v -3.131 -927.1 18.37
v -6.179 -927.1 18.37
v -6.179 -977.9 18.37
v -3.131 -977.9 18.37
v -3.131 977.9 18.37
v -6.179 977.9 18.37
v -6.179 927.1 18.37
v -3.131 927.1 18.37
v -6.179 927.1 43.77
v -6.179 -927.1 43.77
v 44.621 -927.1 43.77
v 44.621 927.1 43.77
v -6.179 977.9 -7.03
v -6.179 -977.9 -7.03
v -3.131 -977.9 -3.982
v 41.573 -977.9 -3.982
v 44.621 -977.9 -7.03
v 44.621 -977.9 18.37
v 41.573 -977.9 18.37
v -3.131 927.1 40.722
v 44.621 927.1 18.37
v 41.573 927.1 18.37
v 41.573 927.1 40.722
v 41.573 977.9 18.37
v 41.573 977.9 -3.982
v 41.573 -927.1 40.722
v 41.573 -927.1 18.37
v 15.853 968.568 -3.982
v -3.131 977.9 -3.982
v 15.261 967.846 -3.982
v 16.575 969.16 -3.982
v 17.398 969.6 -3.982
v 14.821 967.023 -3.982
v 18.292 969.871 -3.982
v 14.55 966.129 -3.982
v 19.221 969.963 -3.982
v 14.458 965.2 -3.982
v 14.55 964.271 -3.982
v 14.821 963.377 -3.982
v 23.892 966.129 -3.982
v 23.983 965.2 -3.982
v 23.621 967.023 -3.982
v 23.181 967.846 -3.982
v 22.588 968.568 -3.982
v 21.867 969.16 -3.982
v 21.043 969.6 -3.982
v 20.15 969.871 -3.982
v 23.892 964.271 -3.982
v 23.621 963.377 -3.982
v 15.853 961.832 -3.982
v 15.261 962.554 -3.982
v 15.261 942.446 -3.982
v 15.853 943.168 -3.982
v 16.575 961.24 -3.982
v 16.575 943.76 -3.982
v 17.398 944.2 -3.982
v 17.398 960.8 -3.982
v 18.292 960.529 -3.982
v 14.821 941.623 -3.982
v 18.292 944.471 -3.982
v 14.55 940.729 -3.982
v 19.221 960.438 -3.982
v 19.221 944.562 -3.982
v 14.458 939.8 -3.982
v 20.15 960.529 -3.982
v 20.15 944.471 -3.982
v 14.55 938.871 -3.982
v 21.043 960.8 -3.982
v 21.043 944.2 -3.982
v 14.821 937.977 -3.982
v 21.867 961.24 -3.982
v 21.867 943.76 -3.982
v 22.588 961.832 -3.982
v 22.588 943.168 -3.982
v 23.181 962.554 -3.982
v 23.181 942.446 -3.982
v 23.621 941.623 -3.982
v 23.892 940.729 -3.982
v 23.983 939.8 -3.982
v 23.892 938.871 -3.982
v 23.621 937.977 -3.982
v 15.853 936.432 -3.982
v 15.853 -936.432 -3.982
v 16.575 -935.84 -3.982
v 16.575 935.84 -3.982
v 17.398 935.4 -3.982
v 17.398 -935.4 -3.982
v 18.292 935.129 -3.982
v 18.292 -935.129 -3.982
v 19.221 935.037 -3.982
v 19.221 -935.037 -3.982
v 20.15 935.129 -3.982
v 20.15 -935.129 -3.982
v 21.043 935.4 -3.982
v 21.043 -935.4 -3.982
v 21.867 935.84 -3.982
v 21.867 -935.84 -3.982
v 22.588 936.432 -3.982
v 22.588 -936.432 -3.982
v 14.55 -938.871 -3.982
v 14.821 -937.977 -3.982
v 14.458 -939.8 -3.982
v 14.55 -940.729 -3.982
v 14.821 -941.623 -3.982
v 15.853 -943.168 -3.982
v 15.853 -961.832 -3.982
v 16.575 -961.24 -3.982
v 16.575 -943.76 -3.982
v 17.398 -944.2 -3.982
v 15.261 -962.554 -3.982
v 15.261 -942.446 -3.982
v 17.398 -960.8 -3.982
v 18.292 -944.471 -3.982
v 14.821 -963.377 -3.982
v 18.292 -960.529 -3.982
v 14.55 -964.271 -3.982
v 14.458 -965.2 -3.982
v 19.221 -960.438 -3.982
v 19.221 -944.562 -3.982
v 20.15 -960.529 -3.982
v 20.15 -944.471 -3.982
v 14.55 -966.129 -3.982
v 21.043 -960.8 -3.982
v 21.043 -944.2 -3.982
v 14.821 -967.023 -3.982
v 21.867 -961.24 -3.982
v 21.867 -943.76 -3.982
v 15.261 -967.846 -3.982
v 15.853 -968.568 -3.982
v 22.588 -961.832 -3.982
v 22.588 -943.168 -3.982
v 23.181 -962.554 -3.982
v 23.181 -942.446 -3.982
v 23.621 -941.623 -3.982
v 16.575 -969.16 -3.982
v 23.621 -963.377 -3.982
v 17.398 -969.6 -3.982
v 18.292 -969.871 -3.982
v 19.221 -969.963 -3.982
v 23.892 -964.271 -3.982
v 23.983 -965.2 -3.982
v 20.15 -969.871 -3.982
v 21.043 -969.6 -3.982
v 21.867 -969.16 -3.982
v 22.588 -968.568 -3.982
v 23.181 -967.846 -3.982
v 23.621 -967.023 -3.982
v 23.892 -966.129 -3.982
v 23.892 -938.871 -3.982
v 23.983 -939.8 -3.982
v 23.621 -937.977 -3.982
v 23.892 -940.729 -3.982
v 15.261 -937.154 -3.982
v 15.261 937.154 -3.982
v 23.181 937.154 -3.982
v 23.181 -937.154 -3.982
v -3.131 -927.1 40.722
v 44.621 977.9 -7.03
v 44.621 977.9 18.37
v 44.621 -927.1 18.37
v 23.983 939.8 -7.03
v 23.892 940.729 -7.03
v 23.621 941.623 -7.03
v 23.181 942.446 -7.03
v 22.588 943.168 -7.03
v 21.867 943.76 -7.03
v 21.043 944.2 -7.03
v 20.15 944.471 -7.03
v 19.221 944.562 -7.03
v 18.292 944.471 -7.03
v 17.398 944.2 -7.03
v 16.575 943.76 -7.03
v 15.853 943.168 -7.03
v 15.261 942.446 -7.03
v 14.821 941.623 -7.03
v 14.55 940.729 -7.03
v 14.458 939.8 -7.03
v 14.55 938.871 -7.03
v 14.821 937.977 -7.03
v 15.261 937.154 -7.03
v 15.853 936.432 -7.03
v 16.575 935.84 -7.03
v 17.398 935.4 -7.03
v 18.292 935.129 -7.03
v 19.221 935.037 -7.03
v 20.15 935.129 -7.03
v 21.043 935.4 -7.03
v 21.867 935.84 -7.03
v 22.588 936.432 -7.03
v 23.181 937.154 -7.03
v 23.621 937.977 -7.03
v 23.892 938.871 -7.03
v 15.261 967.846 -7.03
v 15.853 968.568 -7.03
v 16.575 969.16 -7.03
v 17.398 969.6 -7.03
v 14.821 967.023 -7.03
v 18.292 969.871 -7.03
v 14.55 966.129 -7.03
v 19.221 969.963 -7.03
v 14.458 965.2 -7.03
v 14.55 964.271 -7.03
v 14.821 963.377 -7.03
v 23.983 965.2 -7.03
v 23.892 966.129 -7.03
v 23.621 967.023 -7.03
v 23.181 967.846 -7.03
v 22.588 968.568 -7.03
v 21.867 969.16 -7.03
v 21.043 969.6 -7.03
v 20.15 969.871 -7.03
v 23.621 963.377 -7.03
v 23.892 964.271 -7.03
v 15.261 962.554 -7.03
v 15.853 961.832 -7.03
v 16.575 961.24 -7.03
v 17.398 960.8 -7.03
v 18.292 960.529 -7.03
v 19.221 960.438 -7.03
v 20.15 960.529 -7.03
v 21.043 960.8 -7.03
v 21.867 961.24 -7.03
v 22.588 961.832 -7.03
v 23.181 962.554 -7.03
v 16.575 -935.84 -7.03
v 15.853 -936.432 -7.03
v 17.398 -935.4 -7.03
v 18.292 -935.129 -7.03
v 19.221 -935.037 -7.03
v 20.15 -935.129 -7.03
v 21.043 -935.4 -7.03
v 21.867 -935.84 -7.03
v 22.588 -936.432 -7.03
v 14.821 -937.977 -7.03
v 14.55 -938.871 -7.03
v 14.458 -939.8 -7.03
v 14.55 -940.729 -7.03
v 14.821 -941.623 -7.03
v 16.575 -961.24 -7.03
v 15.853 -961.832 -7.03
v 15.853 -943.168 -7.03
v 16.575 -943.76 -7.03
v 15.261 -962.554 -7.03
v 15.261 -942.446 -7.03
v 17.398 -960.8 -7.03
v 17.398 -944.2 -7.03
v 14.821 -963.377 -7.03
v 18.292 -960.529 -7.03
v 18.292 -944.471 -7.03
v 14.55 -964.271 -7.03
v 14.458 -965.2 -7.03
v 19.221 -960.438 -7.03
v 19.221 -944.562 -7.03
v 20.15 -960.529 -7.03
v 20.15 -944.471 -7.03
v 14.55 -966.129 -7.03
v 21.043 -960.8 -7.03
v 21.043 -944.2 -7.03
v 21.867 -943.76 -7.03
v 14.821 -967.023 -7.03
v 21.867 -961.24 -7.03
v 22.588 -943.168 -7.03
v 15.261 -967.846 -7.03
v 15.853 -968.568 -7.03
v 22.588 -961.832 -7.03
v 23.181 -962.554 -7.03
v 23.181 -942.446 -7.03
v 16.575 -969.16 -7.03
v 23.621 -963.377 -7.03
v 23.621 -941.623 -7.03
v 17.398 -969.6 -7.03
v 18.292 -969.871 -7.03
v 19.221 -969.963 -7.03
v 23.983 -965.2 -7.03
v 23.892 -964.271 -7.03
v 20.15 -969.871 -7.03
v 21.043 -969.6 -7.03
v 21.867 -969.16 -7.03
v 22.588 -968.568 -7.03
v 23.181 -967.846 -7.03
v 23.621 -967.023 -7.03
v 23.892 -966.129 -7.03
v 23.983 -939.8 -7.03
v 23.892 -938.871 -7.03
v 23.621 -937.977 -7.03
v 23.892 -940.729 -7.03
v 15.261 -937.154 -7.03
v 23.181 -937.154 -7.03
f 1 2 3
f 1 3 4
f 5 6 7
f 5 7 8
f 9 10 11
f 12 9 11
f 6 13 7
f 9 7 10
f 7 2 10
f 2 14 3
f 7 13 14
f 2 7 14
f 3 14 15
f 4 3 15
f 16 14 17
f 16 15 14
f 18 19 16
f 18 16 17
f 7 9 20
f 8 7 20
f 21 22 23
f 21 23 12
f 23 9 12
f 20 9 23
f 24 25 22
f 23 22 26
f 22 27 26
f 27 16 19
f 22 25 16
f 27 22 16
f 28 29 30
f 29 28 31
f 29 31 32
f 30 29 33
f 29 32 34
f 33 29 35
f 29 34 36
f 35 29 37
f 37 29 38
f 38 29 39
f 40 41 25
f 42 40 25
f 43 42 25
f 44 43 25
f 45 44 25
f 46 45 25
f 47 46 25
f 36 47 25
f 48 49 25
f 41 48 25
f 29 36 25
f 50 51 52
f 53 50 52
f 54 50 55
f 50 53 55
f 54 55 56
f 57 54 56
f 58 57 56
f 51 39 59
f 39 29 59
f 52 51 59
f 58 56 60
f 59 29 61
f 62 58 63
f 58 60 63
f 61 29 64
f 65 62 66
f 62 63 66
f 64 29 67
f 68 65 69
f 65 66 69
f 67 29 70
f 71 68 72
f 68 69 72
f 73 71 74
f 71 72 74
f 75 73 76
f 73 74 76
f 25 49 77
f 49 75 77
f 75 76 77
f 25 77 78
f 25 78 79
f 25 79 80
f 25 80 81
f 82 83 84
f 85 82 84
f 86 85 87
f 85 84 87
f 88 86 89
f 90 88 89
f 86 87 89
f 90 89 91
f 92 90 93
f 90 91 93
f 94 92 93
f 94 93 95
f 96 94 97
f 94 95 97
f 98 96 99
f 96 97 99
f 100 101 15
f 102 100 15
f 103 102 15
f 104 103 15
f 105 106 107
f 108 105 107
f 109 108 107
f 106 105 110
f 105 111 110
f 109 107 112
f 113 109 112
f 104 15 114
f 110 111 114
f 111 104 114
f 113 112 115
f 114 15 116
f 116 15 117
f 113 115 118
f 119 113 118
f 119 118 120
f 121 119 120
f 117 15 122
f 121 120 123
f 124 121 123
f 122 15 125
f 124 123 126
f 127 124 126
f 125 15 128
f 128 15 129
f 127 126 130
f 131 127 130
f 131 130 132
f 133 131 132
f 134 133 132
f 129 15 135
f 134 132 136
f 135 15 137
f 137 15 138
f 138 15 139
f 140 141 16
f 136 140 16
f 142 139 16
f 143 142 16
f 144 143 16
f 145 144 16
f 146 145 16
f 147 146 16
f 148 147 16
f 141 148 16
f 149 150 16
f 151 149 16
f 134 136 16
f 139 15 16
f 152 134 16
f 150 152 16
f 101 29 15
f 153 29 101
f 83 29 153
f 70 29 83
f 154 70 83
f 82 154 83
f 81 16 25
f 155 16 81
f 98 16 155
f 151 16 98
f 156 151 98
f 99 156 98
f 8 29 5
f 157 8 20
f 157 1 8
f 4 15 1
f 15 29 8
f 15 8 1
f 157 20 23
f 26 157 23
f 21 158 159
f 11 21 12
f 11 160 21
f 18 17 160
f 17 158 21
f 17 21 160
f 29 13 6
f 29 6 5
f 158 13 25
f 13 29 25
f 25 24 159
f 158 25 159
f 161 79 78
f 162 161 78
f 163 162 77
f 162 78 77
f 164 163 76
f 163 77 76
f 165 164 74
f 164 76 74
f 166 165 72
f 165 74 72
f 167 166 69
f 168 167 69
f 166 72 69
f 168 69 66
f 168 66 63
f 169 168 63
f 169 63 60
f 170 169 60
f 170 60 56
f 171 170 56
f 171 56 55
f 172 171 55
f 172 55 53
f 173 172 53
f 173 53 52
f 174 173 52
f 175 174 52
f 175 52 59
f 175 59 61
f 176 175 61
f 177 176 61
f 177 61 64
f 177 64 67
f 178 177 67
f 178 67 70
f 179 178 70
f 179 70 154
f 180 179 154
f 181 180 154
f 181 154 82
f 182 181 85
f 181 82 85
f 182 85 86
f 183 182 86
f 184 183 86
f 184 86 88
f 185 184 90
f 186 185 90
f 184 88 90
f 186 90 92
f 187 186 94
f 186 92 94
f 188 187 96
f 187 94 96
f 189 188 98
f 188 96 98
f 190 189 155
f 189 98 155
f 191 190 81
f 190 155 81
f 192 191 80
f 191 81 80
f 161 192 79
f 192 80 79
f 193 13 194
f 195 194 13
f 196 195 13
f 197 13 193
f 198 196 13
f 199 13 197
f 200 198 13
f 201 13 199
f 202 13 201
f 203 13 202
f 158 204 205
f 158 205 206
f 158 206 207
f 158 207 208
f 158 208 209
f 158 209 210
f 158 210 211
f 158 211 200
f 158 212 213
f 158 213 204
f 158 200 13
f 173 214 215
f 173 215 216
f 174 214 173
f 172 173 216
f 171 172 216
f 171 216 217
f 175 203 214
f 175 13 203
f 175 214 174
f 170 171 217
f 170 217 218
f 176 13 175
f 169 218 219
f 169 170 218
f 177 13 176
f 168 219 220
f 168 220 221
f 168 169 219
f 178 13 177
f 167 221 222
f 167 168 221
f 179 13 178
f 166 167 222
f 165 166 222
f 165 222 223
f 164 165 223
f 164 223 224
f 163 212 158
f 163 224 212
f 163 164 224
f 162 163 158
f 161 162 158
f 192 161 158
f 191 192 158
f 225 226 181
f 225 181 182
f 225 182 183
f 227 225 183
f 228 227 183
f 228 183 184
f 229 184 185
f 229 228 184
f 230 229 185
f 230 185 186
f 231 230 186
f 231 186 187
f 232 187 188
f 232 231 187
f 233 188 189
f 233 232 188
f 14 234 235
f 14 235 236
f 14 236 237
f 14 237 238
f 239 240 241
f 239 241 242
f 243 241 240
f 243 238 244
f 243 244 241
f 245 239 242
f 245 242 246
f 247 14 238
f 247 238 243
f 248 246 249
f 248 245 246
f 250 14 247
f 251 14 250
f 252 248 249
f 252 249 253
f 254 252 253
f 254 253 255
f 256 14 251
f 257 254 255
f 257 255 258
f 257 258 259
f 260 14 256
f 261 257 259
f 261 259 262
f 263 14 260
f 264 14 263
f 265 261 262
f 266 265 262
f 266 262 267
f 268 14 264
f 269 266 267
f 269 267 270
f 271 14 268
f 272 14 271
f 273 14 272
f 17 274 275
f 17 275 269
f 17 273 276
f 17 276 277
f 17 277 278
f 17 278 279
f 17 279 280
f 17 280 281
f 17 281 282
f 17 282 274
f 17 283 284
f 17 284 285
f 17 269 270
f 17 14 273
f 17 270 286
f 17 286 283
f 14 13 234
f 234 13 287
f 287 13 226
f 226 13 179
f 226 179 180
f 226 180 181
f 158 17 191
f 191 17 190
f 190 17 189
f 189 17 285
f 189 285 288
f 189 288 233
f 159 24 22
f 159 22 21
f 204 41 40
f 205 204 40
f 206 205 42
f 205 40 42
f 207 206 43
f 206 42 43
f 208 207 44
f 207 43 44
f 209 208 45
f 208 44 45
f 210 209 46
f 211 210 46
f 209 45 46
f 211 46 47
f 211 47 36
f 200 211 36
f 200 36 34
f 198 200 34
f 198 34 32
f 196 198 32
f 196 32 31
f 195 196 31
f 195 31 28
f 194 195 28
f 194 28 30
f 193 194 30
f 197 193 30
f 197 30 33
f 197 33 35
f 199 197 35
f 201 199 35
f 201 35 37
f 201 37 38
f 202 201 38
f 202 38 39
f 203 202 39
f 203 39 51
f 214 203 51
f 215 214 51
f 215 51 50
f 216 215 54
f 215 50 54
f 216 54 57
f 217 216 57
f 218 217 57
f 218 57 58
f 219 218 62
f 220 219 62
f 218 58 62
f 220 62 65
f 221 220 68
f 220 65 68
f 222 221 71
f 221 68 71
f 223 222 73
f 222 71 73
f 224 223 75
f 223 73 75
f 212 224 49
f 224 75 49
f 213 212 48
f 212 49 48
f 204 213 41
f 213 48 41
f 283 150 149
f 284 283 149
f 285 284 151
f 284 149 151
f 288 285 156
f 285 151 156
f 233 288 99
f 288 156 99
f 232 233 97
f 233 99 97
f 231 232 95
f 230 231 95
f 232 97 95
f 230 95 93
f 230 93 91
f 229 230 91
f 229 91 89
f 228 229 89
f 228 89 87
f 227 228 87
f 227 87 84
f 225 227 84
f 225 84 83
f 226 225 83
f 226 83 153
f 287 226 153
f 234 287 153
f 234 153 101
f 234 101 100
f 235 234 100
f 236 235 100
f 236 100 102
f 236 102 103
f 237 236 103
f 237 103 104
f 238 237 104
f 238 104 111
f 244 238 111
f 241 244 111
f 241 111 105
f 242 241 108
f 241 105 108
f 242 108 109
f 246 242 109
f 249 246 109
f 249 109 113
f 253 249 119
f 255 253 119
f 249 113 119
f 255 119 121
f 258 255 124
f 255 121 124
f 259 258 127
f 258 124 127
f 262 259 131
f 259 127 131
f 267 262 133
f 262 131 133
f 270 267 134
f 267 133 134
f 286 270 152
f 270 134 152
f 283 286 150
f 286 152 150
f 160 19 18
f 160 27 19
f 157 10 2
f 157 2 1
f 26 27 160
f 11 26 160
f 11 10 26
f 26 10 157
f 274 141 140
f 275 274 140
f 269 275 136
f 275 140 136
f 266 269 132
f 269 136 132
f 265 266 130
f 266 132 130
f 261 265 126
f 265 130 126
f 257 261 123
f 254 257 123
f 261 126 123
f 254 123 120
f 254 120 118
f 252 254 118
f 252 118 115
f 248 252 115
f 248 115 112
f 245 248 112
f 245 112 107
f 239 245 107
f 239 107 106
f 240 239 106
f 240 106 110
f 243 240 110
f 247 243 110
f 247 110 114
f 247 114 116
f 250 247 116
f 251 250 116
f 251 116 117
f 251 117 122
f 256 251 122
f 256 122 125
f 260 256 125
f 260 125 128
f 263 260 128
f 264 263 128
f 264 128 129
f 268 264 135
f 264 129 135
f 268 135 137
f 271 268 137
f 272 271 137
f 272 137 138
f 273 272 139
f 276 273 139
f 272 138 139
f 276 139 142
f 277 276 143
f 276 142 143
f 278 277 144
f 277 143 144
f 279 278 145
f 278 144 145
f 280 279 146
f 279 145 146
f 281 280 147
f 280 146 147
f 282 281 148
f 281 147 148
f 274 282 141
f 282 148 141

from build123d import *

# Parameters (mm, degrees)
F0_W     = 50.8
F0_H     = 50.8
F0_W_2   = 44.704
F0_H_2   = 44.704
F1_DEPTH = 977.9
F2_R     = 4.7625
F3_DEPTH = 25.4
F4_W     = 50.8
F4_H     = 101.6
F5_DEPTH = 25.4


with BuildPart() as f1:
    # F0 (on Front) → F1 (new body, symmetric)
    with BuildSketch(Plane.XZ):
        with Locations((19.2208130826, 18.3696289983)):
            Rectangle(F0_W, F0_H)
        with Locations((19.2208130826, 18.3696289983)):
            Rectangle(F0_W_2, F0_H_2, mode=Mode.SUBTRACT)
    extrude(amount=F1_DEPTH, both=True)

    # F2 (on face) → F3 (cut)
    with BuildSketch(Plane.XY.offset(-3.9823710017)):
        with Locations((19.2208130826, -965.2)):
            Circle(F2_R)
        with Locations((19.2208130826, -939.8)):
            Circle(F2_R)
        with Locations((19.2208130826, 965.2)):
            Circle(F2_R)
        with Locations((19.2208130826, 939.8)):
            Circle(F2_R)
    extrude(amount=-F3_DEPTH, mode=Mode.SUBTRACT)

    # F4 (on face) → F5 (cut)
    with BuildSketch(Plane.XY.offset(43.7696289983)):
        with Locations((19.2208130826, -977.9)):
            Rectangle(F4_W, F4_H)
        with Locations((19.2208130826, 977.9)):
            Rectangle(F4_W, F4_H)
    extrude(amount=-F5_DEPTH, mode=Mode.SUBTRACT)


solid = f1.part
